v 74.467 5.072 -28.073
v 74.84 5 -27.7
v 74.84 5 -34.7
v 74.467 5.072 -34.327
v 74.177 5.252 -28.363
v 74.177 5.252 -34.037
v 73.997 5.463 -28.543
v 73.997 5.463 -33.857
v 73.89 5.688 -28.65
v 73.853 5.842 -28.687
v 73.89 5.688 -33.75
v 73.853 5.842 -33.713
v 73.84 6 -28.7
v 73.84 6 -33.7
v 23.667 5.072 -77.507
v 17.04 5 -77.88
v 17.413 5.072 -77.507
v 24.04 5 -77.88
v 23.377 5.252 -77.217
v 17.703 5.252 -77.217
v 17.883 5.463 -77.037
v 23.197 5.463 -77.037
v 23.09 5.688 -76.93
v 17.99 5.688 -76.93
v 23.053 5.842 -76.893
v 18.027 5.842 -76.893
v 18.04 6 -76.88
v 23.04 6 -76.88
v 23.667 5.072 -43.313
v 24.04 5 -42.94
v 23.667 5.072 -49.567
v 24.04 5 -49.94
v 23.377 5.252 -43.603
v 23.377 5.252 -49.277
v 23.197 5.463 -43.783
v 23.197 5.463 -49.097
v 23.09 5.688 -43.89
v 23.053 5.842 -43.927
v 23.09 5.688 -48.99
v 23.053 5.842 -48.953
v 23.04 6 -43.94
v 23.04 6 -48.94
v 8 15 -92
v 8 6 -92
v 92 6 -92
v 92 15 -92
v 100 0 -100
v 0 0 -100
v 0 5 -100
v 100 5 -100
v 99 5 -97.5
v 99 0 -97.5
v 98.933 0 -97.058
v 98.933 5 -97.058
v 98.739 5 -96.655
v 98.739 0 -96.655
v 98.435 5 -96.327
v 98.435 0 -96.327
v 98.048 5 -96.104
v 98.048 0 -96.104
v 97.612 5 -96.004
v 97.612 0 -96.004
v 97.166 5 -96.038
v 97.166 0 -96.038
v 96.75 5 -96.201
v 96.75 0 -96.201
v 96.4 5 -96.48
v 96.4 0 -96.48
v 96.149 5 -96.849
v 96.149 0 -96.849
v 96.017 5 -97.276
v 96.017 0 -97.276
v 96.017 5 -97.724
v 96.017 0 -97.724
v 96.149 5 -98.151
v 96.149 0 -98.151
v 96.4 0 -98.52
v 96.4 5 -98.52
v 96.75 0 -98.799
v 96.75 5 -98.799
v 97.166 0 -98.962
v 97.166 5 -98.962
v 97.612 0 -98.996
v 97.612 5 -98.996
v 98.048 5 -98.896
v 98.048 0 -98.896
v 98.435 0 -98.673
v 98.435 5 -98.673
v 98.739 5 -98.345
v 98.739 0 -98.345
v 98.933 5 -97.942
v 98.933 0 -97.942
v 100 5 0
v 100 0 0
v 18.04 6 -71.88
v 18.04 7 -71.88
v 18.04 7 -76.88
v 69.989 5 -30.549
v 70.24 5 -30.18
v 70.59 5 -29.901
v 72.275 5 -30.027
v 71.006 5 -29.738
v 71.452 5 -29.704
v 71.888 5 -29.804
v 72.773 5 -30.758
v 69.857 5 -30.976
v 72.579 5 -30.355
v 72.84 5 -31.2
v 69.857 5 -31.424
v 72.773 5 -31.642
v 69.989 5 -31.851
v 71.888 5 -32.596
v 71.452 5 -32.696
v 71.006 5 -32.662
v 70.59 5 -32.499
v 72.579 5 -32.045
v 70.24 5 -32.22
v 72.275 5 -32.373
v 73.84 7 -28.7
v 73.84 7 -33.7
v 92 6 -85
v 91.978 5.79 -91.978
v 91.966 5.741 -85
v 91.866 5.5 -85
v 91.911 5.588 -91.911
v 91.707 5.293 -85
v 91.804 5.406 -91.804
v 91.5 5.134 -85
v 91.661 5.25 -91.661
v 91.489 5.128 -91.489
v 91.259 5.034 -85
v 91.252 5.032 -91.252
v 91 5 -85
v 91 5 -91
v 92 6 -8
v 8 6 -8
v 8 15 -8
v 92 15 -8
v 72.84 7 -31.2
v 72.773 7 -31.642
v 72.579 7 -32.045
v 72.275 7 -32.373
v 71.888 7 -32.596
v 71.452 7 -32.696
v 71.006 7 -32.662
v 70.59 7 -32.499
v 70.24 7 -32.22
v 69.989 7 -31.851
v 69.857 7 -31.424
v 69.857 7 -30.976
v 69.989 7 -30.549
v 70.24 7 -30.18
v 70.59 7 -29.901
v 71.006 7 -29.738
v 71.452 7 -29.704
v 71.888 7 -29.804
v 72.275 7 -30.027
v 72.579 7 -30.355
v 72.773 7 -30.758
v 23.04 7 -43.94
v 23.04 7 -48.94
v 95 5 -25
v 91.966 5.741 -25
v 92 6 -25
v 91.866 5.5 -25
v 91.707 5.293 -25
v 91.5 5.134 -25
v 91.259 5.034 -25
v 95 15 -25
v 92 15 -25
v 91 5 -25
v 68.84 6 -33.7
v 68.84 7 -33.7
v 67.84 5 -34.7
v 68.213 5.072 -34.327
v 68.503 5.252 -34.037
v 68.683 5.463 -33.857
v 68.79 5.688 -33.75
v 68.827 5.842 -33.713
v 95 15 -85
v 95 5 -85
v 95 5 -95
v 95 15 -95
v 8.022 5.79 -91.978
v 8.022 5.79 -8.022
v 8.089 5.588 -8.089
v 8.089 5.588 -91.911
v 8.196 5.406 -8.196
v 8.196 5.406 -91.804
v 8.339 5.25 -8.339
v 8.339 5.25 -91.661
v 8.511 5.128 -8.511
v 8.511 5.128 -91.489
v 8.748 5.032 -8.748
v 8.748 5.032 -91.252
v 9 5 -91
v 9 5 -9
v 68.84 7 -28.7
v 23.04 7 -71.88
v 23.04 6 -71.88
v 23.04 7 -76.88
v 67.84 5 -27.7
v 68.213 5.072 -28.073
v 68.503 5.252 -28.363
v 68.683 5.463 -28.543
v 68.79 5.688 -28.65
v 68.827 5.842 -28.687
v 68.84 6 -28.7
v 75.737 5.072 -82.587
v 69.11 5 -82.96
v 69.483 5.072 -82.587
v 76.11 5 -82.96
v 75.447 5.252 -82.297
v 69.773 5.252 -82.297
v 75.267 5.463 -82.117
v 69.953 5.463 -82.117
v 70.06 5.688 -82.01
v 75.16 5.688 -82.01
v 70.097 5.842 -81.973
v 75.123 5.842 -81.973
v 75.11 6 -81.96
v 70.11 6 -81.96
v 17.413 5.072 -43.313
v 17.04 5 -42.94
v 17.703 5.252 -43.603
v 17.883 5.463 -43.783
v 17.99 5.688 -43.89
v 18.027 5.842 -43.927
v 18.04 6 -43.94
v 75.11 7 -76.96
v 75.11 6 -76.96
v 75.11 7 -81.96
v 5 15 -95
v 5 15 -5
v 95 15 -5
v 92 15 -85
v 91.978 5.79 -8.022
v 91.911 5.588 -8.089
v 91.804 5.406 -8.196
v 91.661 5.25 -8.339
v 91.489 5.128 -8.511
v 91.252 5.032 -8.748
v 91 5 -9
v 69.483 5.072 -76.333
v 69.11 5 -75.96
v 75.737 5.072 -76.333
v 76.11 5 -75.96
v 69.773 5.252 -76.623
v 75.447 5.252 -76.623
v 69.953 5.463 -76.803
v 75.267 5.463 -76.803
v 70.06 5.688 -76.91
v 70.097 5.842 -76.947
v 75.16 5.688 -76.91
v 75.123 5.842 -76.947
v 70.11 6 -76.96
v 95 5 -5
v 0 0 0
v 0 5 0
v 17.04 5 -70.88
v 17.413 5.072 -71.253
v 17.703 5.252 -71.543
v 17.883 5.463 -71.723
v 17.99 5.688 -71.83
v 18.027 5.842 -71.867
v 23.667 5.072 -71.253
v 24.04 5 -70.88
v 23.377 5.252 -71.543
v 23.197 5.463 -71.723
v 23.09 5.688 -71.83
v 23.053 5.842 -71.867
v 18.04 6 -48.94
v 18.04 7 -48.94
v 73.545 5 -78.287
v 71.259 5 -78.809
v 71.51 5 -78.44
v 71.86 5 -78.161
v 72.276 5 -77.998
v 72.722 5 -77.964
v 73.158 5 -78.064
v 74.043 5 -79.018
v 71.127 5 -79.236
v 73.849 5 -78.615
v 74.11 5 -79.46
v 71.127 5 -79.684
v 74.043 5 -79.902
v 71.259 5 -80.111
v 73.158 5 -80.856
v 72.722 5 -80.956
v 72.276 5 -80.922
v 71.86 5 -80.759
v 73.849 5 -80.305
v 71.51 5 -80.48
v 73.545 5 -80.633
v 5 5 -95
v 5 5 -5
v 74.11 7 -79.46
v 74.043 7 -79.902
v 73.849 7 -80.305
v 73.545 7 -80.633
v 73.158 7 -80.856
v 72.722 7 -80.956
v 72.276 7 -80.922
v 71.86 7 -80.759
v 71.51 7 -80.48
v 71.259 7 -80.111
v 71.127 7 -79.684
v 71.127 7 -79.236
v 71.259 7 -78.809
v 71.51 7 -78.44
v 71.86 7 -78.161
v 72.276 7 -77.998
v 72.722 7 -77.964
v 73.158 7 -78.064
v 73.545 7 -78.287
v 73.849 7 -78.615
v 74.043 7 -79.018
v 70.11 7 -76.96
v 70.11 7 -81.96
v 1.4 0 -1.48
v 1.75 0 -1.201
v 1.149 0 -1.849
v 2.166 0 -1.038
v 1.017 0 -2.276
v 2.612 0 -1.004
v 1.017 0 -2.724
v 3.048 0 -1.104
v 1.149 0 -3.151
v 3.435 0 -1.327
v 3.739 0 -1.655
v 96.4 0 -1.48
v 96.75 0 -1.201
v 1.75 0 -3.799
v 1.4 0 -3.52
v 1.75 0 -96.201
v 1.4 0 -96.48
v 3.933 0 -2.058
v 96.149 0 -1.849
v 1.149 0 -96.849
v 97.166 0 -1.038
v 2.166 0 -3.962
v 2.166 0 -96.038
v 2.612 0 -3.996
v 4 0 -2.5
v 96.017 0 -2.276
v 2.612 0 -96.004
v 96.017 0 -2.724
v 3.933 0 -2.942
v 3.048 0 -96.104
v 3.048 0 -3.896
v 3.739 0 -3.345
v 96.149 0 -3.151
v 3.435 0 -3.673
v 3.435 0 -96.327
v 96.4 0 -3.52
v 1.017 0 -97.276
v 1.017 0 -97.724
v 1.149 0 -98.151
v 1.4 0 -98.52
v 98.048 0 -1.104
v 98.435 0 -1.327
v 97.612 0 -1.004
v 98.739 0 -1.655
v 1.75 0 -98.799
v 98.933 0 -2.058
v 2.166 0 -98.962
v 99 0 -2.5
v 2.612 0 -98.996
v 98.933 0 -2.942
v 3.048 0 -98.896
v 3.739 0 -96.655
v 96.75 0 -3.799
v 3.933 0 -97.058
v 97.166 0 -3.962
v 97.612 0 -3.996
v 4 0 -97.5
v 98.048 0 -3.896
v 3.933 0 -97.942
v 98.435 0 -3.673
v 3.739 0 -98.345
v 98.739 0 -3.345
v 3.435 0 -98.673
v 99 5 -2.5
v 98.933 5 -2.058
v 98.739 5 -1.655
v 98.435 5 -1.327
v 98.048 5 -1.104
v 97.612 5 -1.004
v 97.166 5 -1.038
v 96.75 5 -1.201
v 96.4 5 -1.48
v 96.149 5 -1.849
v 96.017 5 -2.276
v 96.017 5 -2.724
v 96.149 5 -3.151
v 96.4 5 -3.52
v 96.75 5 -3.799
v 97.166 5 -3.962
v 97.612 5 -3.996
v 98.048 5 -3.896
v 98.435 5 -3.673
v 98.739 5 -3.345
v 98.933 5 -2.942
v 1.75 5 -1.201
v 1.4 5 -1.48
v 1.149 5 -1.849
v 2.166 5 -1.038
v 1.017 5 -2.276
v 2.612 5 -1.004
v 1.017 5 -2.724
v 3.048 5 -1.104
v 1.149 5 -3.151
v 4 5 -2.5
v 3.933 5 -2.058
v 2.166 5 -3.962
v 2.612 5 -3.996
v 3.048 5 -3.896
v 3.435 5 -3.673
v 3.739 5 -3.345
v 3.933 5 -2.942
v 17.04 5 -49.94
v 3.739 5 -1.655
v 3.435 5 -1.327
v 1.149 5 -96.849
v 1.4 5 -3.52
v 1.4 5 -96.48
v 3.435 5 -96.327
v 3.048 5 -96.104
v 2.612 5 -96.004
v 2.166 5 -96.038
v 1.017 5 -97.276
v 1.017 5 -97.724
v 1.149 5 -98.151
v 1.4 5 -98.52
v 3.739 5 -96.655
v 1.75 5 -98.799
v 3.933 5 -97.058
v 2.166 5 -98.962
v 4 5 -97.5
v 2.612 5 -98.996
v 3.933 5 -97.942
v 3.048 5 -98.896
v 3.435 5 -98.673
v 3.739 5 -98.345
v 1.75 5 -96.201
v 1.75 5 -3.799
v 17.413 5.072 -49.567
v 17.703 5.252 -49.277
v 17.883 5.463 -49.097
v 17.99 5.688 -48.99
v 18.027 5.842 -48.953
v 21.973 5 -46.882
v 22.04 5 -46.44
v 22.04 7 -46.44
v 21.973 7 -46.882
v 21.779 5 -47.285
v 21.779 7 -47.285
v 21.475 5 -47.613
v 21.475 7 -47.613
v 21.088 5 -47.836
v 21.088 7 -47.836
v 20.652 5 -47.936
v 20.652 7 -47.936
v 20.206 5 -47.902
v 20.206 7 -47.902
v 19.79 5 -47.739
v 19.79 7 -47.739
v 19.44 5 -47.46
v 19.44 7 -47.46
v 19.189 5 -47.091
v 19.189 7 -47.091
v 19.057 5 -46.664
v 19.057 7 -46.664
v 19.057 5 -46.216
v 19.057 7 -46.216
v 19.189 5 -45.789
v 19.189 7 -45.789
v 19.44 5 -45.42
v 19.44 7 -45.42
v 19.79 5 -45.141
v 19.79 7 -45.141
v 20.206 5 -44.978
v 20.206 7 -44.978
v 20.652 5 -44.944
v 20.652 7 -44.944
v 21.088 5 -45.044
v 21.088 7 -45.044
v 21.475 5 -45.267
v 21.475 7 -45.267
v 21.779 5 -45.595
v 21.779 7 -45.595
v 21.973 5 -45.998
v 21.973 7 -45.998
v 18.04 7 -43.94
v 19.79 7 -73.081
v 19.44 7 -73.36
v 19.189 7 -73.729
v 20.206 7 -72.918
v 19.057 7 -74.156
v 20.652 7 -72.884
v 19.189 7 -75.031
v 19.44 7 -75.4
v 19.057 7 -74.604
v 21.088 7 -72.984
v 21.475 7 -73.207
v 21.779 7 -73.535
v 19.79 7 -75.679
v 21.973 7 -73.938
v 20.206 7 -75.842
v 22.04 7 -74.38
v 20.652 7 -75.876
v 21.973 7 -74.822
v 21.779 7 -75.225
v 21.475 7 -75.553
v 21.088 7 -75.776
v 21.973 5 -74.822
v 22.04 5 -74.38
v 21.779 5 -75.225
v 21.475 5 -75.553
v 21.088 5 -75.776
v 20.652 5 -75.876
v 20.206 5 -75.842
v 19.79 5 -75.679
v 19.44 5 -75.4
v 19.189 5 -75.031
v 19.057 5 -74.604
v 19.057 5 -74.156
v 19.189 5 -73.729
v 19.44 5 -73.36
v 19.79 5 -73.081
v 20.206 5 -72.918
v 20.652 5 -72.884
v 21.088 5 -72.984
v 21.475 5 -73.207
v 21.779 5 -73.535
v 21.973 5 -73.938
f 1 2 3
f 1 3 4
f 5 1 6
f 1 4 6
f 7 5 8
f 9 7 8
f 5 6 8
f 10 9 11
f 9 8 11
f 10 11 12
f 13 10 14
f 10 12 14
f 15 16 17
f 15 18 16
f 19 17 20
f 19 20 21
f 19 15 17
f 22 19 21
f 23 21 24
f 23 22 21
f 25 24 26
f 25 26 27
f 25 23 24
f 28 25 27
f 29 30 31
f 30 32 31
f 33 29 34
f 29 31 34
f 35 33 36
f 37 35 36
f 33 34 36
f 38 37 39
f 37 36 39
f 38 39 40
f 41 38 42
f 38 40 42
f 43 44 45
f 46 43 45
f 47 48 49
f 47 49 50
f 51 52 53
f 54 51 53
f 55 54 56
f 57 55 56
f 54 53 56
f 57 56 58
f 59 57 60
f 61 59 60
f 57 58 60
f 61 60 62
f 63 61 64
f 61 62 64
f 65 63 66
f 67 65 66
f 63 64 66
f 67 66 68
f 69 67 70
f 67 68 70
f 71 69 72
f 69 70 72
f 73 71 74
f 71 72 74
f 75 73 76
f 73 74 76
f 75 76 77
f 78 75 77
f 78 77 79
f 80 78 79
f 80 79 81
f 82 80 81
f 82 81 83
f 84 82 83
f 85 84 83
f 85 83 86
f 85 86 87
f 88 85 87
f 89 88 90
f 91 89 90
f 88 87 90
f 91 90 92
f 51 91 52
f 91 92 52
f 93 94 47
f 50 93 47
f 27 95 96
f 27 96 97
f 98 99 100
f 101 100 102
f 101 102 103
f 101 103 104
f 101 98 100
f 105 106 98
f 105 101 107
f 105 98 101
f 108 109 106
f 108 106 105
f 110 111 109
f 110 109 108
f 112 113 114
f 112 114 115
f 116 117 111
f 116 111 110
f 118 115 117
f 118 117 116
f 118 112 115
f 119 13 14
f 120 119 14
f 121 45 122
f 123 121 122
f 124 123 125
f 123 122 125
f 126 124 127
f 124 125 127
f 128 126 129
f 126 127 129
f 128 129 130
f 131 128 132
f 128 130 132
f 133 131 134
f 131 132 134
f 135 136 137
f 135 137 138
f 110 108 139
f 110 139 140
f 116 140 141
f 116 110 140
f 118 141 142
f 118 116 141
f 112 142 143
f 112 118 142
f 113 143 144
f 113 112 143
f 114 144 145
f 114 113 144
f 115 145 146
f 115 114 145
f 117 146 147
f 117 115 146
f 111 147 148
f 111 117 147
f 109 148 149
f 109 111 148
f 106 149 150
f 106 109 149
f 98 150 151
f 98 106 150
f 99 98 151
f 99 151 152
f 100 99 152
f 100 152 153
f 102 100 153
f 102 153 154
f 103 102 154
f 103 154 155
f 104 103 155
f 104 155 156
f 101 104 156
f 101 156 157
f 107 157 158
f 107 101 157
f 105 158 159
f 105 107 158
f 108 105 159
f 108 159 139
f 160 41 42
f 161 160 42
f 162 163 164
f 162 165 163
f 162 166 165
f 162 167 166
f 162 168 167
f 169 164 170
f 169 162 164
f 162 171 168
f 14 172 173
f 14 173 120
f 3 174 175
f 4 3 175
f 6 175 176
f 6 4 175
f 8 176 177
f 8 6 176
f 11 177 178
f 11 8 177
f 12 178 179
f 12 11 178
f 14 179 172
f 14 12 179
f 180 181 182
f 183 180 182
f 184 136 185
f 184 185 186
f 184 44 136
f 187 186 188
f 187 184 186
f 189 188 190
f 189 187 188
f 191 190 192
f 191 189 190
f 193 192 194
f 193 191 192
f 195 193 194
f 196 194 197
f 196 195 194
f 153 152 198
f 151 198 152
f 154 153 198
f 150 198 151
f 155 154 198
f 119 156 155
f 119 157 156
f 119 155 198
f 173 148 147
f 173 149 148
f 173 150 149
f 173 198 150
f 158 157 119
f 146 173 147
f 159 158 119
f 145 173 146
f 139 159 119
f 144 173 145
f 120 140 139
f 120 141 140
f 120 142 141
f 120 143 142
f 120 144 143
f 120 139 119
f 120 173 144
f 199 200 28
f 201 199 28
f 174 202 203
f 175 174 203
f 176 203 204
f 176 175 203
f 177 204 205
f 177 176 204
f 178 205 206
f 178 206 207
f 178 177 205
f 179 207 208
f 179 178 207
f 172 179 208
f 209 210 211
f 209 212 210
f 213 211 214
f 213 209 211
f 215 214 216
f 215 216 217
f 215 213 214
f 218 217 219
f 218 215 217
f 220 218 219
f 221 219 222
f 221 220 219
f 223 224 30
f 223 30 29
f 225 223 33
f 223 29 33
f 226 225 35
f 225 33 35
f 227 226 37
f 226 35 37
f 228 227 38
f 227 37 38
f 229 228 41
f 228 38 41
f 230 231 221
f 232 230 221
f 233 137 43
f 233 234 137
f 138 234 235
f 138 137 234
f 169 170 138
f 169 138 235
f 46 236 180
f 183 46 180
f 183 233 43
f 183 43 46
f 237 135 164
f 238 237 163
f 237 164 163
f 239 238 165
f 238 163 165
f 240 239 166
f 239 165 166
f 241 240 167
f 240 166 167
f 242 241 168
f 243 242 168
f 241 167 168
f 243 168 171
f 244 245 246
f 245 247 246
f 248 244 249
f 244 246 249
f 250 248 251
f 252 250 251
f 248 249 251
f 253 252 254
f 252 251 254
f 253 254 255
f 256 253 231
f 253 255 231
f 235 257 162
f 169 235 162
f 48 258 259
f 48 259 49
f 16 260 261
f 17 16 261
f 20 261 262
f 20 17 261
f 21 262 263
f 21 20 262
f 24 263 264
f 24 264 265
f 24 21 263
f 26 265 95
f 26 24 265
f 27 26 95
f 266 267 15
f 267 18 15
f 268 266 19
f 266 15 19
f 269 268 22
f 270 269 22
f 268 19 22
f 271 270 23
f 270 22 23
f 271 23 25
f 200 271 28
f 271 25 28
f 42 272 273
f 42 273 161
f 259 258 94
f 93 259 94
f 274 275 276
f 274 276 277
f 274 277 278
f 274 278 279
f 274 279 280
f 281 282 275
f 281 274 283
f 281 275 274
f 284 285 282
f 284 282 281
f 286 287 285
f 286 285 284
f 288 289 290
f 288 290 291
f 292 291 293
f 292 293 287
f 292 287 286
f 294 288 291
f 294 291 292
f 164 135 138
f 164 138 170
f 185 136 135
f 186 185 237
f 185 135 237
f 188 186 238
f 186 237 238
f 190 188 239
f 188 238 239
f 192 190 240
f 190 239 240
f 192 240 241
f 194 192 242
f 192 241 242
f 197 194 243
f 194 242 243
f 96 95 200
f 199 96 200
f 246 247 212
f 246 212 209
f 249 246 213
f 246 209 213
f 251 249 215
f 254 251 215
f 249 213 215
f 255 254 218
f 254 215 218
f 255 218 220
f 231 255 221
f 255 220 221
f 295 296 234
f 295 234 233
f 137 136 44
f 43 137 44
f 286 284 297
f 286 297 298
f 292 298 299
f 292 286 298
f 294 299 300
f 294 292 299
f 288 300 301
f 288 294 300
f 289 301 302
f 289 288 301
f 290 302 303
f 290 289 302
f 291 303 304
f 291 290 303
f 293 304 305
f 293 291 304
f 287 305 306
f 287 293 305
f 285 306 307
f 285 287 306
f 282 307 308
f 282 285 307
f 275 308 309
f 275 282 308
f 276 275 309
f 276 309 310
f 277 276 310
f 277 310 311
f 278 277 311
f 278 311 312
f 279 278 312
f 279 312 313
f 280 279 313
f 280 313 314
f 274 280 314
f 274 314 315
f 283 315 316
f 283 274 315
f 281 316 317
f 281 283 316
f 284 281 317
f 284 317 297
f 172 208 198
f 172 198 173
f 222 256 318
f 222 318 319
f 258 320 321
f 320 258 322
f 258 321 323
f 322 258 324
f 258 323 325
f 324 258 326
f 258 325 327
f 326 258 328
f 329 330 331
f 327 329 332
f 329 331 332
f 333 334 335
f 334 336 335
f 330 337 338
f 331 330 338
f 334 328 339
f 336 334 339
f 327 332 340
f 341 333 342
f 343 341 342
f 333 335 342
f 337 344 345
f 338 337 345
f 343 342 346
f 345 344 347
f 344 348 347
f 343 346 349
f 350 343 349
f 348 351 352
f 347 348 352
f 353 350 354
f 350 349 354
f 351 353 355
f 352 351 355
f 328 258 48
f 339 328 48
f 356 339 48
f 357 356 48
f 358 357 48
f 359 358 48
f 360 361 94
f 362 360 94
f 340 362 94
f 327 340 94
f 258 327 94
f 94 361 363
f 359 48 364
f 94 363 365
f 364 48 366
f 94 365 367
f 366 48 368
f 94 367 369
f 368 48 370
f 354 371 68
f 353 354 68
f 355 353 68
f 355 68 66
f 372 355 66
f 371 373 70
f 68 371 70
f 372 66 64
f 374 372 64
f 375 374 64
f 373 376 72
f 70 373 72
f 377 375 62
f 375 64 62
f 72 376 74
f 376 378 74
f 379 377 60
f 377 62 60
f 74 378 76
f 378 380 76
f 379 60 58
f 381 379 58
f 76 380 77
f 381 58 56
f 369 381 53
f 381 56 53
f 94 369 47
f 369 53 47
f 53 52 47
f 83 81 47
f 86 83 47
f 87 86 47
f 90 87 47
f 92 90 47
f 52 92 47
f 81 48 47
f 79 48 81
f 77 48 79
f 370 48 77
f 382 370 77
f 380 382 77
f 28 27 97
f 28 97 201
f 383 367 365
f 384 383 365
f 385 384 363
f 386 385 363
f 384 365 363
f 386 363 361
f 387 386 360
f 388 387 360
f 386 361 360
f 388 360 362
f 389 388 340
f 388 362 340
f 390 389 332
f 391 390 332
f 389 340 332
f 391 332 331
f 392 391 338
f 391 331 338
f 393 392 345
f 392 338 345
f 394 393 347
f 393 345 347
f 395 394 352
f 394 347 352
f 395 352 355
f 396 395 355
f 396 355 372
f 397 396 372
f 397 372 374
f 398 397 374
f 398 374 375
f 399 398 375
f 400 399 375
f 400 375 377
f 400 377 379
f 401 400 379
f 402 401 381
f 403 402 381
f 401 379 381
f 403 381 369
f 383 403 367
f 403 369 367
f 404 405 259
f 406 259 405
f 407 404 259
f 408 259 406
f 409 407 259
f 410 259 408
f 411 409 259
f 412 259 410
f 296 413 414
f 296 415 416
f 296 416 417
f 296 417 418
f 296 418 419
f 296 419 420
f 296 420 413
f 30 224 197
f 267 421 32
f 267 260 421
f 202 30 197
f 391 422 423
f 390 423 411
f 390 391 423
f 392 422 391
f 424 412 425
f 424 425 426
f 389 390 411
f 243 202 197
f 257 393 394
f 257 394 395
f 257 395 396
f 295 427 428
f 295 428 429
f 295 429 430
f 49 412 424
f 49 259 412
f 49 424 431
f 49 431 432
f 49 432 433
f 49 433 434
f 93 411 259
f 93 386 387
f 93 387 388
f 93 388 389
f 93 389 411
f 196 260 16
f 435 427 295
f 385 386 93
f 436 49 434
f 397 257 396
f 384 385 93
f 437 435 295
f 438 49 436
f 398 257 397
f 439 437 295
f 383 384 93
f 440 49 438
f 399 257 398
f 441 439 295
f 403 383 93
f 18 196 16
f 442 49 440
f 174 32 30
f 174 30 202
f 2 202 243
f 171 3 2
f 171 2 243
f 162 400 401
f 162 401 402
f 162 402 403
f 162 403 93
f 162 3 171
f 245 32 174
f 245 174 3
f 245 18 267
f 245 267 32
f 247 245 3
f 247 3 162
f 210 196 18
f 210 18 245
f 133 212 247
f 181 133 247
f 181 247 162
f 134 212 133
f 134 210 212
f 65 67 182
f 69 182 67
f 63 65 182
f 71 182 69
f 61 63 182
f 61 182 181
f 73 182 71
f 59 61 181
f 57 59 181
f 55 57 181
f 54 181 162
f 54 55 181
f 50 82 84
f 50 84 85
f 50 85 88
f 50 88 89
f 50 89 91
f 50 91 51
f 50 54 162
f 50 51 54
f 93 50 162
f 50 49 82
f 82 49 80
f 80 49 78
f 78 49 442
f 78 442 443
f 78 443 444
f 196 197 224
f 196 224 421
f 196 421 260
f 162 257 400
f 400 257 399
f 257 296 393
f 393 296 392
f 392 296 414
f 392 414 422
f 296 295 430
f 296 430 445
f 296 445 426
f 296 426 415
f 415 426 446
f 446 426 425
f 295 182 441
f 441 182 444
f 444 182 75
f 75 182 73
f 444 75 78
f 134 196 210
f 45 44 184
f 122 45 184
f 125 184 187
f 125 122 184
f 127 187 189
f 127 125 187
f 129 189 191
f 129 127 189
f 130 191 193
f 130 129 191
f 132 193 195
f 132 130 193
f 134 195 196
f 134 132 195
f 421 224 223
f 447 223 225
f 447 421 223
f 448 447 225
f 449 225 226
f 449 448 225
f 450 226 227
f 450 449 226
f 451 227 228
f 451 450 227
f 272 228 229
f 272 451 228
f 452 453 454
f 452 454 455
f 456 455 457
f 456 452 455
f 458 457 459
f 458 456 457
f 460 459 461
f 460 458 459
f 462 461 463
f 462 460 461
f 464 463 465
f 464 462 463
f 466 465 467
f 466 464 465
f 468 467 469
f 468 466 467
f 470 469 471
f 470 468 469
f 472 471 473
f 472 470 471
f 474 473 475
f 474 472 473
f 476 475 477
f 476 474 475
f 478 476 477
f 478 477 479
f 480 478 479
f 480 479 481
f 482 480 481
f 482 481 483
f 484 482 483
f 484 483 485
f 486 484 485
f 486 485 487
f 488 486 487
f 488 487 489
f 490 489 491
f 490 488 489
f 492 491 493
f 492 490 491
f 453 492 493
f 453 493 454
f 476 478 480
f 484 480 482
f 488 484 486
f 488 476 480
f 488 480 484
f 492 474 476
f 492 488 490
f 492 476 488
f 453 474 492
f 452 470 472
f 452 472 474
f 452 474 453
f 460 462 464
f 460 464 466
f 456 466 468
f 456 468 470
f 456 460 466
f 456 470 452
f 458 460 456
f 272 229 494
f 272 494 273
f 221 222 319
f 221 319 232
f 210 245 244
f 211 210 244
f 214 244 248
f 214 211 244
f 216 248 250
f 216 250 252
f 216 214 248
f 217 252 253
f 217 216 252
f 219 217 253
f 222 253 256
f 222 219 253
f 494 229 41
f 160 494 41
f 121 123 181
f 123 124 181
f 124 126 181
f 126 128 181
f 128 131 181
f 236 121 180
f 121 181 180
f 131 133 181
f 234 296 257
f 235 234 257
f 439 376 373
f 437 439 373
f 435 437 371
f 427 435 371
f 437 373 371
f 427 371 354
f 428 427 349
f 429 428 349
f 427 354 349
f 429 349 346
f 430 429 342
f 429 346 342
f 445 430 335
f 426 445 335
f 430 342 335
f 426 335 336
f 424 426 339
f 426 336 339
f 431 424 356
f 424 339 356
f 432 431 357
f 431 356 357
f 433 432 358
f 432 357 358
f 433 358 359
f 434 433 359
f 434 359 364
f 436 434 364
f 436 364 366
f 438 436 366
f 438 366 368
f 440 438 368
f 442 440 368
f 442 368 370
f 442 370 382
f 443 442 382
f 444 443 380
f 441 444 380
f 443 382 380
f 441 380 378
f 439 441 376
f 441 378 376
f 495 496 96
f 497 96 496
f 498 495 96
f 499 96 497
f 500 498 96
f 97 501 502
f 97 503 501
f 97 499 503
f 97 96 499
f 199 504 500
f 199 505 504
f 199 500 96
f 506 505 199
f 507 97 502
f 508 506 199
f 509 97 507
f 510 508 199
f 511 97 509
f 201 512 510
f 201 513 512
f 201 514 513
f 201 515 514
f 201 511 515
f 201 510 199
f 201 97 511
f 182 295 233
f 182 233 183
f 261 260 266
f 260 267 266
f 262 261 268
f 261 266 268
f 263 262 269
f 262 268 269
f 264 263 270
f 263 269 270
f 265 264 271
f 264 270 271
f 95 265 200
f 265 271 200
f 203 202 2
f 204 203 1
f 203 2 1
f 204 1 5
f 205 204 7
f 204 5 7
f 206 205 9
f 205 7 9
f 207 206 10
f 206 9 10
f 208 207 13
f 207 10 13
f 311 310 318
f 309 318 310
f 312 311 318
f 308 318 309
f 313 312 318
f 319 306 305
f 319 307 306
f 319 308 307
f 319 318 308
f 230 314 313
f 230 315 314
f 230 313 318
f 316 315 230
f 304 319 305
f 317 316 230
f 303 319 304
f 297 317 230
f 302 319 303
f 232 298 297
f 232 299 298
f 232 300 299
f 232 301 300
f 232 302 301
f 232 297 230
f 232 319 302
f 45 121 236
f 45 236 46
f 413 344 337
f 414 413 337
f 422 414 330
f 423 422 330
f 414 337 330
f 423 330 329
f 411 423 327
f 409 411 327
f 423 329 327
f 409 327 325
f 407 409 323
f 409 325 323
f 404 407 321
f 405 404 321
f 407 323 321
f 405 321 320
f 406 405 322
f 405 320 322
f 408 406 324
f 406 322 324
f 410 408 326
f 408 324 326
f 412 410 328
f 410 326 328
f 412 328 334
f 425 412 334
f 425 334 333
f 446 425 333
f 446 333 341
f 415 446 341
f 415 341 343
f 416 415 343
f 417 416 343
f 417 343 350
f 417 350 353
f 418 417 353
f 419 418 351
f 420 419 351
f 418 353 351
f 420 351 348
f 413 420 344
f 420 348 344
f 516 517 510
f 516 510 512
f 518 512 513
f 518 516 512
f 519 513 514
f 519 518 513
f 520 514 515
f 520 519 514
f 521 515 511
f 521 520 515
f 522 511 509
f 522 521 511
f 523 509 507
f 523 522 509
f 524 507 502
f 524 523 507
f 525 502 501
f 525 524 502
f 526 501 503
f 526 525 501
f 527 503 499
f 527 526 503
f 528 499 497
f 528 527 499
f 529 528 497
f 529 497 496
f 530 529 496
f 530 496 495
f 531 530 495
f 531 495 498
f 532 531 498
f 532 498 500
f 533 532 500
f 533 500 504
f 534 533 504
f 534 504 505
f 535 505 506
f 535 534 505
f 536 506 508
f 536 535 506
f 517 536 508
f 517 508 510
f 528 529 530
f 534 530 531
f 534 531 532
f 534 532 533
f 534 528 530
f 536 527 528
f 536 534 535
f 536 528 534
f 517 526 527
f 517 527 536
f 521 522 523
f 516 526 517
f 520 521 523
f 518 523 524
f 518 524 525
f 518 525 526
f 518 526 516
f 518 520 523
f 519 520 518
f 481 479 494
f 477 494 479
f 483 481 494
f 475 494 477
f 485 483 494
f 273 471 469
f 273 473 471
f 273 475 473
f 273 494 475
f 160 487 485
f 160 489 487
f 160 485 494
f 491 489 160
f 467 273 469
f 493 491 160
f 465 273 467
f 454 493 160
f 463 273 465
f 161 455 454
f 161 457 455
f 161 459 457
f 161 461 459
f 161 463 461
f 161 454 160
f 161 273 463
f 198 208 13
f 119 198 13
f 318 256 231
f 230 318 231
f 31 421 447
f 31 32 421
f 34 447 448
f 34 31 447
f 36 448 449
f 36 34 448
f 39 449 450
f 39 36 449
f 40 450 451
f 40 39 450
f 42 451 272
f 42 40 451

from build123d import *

# Parameters (mm, degrees)
SKETCH1_W            = 100
SKETCH1_H            = 100
BOSS_EXTRUDE1_DEPTH  = 5
SKETCH2_W            = 90
SKETCH2_H            = 90
SKETCH2_W_2          = 84
SKETCH2_H_2          = 84
BOSS_EXTRUDE2_DEPTH  = 10
SKETCH4_W            = 5
SKETCH4_H            = 5
SKETCH4_R            = 1.5
BOSS_EXTRUDE3_DEPTH  = 2
FILLET1_R            = 1
SKETCH5_W            = 60
SKETCH5_H            = 10
CUT_EXTRUDE1_DEPTH   = 5
SKETCH6_R            = 1.5
CUT_EXTRUDE2_DEPTH   = 5
LPATTERN1_COUNT      = 2
LPATTERN1_PITCH      = 95
LPATTERN1_COUNT_DIR2 = 2
LPATTERN1_PITCH_DIR2 = 95


with BuildPart() as part:
    # Sketch1 → Boss-Extrude1 (new body)
    with BuildSketch(Plane(origin=(0, 0, 0), x_dir=(1, 0, 0), z_dir=(0, 1, 0))):
        with Locations((50, 50)):
            Rectangle(SKETCH1_W, SKETCH1_H)
    extrude(amount=BOSS_EXTRUDE1_DEPTH)

    # Sketch2 → Boss-Extrude2 (add)
    with BuildSketch(Plane(origin=(0, 5, 0), x_dir=(1, 0, 0), z_dir=(0, 1, 0))):
        with Locations((50, 50)):
            Rectangle(SKETCH2_W, SKETCH2_H)
        with Locations((50, 50)):
            Rectangle(SKETCH2_W_2, SKETCH2_H_2, mode=Mode.SUBTRACT)
    extrude(amount=BOSS_EXTRUDE2_DEPTH)

    # Sketch4 → Boss-Extrude3 (add)
    with BuildSketch(Plane(origin=(0, 5, 0), x_dir=(1, 0, 0), z_dir=(0, 1, 0))):
        with Locations((20.54, 46.44)):
            Rectangle(SKETCH4_W, SKETCH4_H)
        with Locations((20.54, 46.44)):
            Circle(SKETCH4_R, mode=Mode.SUBTRACT)
        with Locations((20.54, 74.38)):
            Rectangle(SKETCH4_W, SKETCH4_H)
        with Locations((20.54, 74.38)):
            Circle(SKETCH4_R, mode=Mode.SUBTRACT)
        with Locations((72.61, 79.46)):
            Rectangle(SKETCH4_W, SKETCH4_H)
        with Locations((72.61, 79.46)):
            Circle(SKETCH4_R, mode=Mode.SUBTRACT)
        with Locations((71.34, 31.2)):
            Rectangle(SKETCH4_W, SKETCH4_H)
        with Locations((71.34, 31.2)):
            Circle(SKETCH4_R, mode=Mode.SUBTRACT)
    extrude(amount=BOSS_EXTRUDE3_DEPTH)

    # Fillet1
    fillet1_edges = [part.edges().sort_by_distance(p)[0] for p in [
        (8, 5, -50),
        (50, 5, -8),
        (92, 5, -50),
        (50, 5, -92),
        (23.04, 5, -74.38),
        (20.54, 5, -76.88),
        (18.04, 5, -74.38),
        (20.54, 5, -71.88),
        (75.11, 5, -79.46),
        (72.61, 5, -81.96),
        (70.11, 5, -79.46),
        (72.61, 5, -76.96),
        (23.04, 5, -46.44),
        (20.54, 5, -48.94),
        (18.04, 5, -46.44),
        (20.54, 5, -43.94),
        (73.84, 5, -31.2),
        (71.34, 5, -33.7),
        (68.84, 5, -31.2),
        (71.34, 5, -28.7),
    ]]
    fillet(fillet1_edges, radius=FILLET1_R)

    # Sketch5 → Cut-Extrude1 (cut)
    with BuildSketch(Plane(origin=(95, 0, 0), x_dir=(0, 0, -1), z_dir=(1, 0, 0))):
        with Locations((55, 10)):
            Rectangle(SKETCH5_W, SKETCH5_H)
    extrude(amount=-CUT_EXTRUDE1_DEPTH, mode=Mode.SUBTRACT)

    # Sketch6 → Cut-Extrude2 (cut)
    with BuildSketch(Plane.XZ):
        with Locations((2.5, -2.5)):
            Circle(SKETCH6_R)
    cut_extrude2 = extrude(amount=-CUT_EXTRUDE2_DEPTH, mode=Mode.SUBTRACT)

    # LPattern1: Cut-Extrude2 2 × 2
    with Locations(*[(i * LPATTERN1_PITCH, 0, -j * LPATTERN1_PITCH_DIR2) for i in range(LPATTERN1_COUNT) for j in range(LPATTERN1_COUNT_DIR2) if (i, j) != (0, 0)]):
        add(cut_extrude2, mode=Mode.SUBTRACT)


solid = part.part
